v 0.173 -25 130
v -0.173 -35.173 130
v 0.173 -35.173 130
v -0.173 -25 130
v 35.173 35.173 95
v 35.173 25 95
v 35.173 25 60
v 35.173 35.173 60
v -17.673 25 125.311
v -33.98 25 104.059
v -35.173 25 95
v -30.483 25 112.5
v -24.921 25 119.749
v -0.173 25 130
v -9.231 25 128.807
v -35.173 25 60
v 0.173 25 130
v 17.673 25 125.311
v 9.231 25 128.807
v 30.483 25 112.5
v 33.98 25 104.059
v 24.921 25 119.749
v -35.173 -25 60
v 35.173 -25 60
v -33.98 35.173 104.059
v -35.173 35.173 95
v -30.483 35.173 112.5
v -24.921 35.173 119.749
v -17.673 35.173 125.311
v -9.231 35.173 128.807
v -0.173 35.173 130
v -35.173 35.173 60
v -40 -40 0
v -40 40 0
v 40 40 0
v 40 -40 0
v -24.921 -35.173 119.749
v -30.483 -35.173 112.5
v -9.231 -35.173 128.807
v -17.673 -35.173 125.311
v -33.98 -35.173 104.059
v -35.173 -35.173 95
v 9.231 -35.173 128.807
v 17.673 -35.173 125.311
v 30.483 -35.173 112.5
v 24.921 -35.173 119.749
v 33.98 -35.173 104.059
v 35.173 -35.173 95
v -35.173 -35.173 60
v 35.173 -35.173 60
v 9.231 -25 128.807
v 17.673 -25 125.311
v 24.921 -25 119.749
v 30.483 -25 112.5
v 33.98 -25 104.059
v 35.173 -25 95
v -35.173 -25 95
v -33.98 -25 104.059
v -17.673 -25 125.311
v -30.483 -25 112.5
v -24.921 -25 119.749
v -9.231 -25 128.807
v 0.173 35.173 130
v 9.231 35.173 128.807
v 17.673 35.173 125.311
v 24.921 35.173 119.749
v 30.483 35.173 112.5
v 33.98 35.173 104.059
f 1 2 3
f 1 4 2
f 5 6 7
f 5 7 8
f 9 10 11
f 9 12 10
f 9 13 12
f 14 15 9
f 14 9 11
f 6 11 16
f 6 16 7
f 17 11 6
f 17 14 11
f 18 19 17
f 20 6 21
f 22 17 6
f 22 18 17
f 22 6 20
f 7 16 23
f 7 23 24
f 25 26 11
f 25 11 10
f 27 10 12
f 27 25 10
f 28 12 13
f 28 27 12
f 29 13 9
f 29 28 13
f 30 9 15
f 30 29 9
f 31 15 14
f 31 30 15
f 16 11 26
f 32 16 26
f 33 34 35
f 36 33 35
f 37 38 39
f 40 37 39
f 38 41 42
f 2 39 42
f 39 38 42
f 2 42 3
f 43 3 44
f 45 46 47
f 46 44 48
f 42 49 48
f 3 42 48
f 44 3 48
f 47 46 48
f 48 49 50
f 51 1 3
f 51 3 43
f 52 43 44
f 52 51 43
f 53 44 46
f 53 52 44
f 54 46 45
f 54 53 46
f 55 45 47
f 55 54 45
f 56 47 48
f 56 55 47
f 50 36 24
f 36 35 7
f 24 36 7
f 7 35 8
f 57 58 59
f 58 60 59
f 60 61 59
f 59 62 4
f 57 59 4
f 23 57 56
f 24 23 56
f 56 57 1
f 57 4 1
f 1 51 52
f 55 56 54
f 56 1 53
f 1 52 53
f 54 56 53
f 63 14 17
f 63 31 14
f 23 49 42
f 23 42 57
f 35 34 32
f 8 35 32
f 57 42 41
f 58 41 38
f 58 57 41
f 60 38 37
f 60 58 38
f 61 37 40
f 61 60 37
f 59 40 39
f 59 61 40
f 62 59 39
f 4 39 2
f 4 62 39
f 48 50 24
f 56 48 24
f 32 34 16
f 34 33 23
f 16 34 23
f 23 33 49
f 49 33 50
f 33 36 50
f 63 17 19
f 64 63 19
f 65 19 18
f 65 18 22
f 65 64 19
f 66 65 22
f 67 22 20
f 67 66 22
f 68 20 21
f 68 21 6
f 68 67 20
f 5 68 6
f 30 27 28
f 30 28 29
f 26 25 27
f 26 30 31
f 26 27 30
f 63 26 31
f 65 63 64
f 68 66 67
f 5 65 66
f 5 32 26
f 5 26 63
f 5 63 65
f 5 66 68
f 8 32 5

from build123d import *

# Parameters (mm, degrees)
SZKIC1_W                    = 80
SZKIC1_H                    = 80
DODANIE_WYCI_GNI_CIE1_DEPTH = 60
DODANIE_WYCI_GNI_CIE1_TAPER = 4.6
SZKIC6_W                    = 70.345029246
SZKIC6_H                    = 70.345029246
DODANIE_WYCI_GNI_CIE2_DEPTH = 70
ZAOKR_GLENIE3_R             = 35
ZAOKR_GLENIE4_R             = 35
SZKIC7_W                    = 70.345029246
SZKIC7_H                    = 50
WYTNIJ_WYCI_GNI_CIE3_DEPTH  = 70


with BuildPart() as part:
    # Szkic1 → Dodanie-wyciągnięcie1 (new body)
    with BuildSketch(Plane.XY):
        Rectangle(SZKIC1_W, SZKIC1_H)
    extrude(amount=DODANIE_WYCI_GNI_CIE1_DEPTH, taper=DODANIE_WYCI_GNI_CIE1_TAPER)

    # Szkic6 → Dodanie-wyciągnięcie2 (add)
    with BuildSketch(Plane.XY.offset(60)):
        Rectangle(SZKIC6_W, SZKIC6_H)
    extrude(amount=DODANIE_WYCI_GNI_CIE2_DEPTH)

    # Zaokrąglenie3
    zaokr_glenie3_edges = [part.edges().sort_by_distance(p)[0] for p in [
        (-35.172514623, 0, 130),
    ]]
    fillet(zaokr_glenie3_edges, radius=ZAOKR_GLENIE3_R)

    # Zaokrąglenie4
    zaokr_glenie4_edges = [part.edges().sort_by_distance(p)[0] for p in [
        (35.172514623, 0, 130),
    ]]
    fillet(zaokr_glenie4_edges, radius=ZAOKR_GLENIE4_R)

    # Szkic7 → Wytnij-wyciągnięcie3 (cut)
    with BuildSketch(Plane.XY.offset(130)):
        Rectangle(SZKIC7_W, SZKIC7_H)
    extrude(amount=-WYTNIJ_WYCI_GNI_CIE3_DEPTH, mode=Mode.SUBTRACT)


solid = part.part
